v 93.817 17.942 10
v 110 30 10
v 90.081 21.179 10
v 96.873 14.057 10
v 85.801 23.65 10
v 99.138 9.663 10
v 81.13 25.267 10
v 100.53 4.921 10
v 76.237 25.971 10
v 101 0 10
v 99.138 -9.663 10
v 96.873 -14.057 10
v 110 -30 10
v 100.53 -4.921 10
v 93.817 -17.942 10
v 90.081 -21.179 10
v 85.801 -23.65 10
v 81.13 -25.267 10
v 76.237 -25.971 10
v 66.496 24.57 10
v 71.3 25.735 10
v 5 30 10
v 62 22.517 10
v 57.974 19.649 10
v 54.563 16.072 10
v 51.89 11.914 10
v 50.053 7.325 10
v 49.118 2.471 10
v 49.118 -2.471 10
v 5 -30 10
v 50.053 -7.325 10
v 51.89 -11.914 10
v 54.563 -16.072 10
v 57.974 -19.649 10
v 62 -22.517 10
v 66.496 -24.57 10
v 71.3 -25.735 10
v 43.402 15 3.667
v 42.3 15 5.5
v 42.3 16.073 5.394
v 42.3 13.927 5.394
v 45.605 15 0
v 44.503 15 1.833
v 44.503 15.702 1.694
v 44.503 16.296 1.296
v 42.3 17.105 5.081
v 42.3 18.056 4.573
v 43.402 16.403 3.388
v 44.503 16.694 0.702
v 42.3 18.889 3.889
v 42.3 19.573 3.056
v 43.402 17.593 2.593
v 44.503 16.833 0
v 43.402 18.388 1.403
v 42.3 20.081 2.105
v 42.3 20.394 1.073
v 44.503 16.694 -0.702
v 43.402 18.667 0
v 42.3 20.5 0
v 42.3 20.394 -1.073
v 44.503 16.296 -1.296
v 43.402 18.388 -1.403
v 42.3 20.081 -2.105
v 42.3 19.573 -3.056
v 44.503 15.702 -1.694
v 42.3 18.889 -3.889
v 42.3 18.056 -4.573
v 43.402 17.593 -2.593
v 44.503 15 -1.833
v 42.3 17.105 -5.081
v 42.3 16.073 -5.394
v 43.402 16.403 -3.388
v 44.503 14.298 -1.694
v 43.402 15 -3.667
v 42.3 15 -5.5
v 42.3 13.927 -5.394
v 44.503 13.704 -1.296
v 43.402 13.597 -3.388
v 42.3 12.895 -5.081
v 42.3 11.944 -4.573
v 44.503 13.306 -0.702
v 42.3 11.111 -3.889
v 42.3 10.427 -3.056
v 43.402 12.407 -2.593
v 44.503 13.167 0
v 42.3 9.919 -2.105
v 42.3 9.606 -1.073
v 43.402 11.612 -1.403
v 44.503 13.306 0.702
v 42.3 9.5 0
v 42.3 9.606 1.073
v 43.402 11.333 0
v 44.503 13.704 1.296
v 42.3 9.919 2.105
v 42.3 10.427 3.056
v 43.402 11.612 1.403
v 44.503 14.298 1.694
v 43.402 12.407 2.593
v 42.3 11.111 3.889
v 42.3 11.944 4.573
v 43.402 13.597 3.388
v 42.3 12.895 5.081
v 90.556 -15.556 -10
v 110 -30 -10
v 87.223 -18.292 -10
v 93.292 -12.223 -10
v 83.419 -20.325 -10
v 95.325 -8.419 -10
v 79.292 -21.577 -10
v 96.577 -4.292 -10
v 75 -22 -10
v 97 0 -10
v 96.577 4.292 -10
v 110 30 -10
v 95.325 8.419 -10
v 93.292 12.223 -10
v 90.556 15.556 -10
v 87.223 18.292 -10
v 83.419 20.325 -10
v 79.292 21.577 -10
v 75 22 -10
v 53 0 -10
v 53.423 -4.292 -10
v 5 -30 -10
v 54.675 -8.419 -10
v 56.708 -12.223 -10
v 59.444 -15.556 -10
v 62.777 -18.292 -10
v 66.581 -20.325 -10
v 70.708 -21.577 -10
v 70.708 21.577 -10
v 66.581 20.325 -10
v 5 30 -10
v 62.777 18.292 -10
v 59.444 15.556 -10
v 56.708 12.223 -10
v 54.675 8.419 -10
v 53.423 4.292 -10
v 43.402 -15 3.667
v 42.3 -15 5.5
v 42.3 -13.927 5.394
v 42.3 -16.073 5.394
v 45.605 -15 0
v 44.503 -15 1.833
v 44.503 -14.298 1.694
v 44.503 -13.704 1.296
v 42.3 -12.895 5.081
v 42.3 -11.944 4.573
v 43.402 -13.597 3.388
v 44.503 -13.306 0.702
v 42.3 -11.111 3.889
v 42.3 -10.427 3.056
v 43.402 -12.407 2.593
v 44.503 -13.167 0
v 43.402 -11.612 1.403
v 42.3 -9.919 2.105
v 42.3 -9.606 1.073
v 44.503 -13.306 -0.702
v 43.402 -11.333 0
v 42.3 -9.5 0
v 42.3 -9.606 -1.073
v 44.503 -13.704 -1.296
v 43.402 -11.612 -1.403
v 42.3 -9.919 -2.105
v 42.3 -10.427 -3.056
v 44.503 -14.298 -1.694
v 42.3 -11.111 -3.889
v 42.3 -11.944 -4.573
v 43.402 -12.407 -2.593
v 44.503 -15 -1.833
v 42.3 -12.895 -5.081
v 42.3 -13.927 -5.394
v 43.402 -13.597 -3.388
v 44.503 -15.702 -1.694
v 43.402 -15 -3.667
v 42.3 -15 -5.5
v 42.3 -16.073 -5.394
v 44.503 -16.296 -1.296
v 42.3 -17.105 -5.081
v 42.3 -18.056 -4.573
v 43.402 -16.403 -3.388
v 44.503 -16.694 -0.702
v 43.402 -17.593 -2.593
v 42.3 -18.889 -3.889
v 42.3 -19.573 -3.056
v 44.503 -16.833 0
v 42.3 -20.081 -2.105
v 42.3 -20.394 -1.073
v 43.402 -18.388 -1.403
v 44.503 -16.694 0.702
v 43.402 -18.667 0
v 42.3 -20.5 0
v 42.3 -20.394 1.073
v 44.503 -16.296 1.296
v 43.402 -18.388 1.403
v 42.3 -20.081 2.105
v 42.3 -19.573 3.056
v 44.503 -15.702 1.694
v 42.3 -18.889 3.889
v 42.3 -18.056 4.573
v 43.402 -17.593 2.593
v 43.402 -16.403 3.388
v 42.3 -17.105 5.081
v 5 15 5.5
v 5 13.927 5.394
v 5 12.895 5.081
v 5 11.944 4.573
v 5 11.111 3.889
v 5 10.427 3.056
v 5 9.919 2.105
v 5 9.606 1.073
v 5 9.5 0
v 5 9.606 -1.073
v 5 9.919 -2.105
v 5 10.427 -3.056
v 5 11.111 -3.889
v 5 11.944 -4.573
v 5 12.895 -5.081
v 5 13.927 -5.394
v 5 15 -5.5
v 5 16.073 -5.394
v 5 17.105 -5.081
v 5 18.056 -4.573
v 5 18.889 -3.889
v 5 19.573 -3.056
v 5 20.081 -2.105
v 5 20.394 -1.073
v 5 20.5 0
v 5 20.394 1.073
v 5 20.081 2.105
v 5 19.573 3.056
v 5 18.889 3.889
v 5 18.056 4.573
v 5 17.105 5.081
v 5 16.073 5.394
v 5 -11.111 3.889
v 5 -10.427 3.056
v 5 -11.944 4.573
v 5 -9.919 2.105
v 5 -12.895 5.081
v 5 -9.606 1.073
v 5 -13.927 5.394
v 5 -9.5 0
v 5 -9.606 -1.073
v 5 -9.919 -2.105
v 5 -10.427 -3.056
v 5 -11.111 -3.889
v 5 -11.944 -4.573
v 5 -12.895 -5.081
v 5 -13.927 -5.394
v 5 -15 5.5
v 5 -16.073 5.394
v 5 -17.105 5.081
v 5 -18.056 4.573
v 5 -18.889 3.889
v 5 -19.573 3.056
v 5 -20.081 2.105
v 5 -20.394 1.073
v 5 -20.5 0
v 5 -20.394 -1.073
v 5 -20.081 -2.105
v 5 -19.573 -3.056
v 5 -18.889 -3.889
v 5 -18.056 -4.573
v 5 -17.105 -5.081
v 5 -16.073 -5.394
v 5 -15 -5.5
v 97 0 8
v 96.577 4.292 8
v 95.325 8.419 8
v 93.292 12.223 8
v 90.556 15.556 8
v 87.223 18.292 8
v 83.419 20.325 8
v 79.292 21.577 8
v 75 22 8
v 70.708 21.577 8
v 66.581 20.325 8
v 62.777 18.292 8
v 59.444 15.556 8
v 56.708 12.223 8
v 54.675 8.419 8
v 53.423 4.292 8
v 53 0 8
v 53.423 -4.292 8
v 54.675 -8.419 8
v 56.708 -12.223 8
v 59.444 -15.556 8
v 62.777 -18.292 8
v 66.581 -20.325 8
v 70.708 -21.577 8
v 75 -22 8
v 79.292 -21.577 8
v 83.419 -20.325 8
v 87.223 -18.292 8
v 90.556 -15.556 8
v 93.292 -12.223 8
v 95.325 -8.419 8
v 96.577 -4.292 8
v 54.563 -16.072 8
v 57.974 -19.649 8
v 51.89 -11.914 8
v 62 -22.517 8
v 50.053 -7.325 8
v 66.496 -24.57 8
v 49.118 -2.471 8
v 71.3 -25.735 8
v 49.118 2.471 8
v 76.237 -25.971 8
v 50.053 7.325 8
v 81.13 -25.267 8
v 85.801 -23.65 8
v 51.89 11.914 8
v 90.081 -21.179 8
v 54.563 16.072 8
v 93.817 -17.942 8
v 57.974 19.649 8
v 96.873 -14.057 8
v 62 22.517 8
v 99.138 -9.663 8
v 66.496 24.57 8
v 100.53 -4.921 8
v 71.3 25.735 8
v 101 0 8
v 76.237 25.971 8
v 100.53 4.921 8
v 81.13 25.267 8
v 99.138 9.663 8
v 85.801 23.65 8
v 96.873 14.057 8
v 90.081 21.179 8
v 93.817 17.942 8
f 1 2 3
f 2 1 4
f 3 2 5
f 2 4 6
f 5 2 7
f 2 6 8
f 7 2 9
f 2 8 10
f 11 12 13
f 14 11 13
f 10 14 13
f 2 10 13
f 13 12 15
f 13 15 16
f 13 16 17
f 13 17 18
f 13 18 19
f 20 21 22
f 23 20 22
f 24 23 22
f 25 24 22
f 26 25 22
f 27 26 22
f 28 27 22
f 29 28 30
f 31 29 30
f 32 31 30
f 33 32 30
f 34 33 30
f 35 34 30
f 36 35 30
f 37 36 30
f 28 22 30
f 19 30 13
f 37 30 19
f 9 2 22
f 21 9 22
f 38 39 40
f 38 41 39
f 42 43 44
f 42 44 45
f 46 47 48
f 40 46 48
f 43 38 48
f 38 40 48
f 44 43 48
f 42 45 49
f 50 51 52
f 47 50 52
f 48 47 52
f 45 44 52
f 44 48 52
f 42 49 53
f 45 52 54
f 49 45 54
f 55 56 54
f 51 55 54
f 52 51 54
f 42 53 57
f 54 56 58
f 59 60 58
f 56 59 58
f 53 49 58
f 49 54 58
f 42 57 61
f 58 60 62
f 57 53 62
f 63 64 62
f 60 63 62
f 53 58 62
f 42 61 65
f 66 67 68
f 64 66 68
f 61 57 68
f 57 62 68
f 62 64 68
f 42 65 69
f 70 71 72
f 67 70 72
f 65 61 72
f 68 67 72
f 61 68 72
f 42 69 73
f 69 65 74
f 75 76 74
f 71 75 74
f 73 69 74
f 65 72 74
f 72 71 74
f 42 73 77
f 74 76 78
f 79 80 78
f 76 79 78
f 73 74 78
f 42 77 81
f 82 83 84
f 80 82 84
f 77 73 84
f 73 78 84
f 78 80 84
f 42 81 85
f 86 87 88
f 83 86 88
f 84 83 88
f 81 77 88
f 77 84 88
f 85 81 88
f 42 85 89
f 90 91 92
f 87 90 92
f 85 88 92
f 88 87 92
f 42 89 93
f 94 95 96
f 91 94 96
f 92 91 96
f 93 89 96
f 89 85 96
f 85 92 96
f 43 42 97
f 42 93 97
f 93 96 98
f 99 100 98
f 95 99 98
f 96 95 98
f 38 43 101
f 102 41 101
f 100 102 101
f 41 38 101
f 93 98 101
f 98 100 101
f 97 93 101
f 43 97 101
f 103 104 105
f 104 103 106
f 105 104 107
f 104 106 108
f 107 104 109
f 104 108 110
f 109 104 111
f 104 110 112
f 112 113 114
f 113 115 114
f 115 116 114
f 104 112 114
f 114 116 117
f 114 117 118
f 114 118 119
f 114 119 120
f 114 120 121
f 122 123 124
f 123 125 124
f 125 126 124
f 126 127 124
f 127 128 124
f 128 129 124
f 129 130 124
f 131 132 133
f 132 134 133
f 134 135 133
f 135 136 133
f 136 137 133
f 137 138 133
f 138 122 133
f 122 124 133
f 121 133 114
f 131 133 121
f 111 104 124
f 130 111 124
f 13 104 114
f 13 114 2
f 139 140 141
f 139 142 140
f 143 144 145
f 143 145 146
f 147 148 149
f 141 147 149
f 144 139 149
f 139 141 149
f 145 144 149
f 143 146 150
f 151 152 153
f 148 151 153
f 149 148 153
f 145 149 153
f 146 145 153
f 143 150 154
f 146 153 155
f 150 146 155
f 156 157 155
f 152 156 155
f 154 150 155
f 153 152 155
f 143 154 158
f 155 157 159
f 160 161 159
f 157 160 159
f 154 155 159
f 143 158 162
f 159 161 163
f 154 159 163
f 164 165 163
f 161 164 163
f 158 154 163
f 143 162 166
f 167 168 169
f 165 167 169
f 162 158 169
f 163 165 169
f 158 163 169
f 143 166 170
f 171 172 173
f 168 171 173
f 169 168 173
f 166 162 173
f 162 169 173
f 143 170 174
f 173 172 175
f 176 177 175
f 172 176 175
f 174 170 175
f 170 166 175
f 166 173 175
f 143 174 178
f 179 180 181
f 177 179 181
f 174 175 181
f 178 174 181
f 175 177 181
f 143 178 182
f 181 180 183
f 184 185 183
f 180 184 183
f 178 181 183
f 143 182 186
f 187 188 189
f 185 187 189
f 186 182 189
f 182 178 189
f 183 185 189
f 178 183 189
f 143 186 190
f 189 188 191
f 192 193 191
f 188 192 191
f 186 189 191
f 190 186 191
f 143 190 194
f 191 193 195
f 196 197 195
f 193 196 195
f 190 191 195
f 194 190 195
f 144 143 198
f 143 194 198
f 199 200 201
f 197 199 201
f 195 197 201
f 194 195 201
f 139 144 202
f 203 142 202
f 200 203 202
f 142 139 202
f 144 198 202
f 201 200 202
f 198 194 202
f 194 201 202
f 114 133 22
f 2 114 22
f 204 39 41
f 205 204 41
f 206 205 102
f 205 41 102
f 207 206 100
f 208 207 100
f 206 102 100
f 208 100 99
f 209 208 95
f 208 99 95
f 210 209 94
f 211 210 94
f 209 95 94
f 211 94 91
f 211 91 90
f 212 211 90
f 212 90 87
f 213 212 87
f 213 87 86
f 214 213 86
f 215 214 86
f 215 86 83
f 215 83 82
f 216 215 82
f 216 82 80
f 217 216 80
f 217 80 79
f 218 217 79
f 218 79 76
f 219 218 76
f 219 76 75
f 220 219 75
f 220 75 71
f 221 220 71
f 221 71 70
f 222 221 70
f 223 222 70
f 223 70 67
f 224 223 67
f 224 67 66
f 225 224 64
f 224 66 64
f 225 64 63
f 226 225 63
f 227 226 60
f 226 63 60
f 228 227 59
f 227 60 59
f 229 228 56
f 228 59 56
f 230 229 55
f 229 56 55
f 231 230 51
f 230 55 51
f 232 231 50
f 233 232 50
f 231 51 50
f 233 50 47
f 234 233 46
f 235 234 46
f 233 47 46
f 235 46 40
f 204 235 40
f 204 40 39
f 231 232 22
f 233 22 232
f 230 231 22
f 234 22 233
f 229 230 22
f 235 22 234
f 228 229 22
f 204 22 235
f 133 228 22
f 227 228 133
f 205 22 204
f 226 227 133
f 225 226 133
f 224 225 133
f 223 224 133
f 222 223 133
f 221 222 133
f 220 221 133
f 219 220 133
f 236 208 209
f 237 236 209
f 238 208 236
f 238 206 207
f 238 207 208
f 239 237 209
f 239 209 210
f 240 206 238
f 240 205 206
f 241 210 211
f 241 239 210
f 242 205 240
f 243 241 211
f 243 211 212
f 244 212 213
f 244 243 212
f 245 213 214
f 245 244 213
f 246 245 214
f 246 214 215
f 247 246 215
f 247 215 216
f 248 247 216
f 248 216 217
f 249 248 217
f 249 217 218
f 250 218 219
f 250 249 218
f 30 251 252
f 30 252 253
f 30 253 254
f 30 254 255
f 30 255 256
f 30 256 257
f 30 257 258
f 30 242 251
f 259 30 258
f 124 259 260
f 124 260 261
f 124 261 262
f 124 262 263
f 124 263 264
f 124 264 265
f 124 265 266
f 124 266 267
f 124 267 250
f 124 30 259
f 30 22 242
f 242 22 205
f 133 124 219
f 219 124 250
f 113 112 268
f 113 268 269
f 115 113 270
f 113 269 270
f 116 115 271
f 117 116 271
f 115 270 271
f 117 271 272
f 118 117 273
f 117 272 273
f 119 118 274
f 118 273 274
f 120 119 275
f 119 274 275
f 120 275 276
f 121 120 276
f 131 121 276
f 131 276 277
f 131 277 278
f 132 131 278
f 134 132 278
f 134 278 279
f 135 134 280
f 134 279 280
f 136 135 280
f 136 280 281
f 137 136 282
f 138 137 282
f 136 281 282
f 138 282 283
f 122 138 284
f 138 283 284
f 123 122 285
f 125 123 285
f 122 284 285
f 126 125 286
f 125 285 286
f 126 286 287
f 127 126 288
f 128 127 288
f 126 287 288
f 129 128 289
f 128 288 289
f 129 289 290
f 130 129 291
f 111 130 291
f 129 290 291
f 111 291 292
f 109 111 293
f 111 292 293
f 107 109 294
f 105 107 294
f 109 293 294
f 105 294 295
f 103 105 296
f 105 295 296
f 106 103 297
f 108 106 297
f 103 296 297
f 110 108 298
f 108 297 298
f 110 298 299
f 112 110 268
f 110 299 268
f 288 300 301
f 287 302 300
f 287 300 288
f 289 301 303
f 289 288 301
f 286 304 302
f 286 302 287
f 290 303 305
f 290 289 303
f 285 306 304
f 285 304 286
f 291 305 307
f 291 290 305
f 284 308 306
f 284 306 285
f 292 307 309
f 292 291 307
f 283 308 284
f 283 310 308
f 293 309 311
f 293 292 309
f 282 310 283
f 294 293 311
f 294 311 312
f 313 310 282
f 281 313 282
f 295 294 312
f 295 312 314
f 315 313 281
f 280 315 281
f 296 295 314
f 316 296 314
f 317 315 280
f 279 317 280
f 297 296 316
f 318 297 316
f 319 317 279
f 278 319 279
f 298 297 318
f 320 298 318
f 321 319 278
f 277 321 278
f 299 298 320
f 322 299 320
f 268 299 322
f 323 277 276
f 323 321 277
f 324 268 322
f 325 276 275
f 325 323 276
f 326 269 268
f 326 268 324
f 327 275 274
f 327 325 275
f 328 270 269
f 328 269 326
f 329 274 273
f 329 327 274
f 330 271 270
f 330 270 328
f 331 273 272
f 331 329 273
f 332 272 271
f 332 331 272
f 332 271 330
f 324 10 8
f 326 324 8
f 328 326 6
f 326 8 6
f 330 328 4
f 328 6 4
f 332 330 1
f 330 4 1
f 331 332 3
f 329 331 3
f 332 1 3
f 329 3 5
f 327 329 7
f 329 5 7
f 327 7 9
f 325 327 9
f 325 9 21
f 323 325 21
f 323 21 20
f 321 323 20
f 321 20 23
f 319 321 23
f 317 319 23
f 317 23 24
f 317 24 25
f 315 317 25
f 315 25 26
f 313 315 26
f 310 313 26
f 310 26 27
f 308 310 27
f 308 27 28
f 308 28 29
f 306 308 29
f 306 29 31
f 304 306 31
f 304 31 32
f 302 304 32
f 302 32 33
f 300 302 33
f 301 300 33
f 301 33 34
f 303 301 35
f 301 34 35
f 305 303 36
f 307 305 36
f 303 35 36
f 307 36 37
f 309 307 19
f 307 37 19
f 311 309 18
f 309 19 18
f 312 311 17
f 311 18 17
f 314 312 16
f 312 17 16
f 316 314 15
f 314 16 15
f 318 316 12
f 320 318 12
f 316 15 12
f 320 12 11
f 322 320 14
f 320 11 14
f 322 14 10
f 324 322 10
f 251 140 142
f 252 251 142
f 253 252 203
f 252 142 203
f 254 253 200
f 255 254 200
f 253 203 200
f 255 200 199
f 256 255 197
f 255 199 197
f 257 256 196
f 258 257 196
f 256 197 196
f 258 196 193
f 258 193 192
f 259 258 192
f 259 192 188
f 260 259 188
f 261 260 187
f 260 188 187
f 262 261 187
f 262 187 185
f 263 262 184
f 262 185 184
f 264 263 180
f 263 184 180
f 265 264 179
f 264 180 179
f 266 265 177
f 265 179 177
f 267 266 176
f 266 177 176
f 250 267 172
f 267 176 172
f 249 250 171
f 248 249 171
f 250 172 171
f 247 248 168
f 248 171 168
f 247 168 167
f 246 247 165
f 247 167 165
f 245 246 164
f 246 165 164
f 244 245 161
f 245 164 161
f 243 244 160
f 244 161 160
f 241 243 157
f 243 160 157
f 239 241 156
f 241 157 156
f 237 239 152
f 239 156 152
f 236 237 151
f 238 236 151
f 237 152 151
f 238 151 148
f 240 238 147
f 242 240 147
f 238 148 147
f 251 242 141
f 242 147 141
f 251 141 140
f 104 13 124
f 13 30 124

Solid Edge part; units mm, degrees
sketch "Sketch1" plane through (0, 0, 0) normal (1, 0, 0) x (0, 1, 0)
  line L0 (-30, -10) -> (30, -10)
  line L1 (30, -10) -> (30, 10)
  line L2 (30, 10) -> (-30, 10)
  line L3 (-30, 10) -> (-30, -10)
extrude "Protrusion1" add sketch "Sketch1" along normal blind 110
sketch "Sketch2" plane through (50, 0, 10) normal (0, 0, 1) x (1, 0, 0)
  circle A0 centre (25, 0) radius 22
extrude "ExtrudedCutout_1" cut sketch "Sketch2" against normal blind 30.1603
sketch "Sketch3" plane through (50, 0, 10) normal (0, 0, 1) x (1, 0, 0)
  circle A0 centre (25, 0) radius 26
extrude "ExtrudedCutout_2" cut sketch "Sketch3" against normal blind 2
sketch "Sketch4" plane through (0, 0, 0) normal (-1, 0, 0) x (0, -1, 0)
  line L0 (30, 10) -> (-30, 10)
  line L1 (-30, 10) -> (-30, -10)
  line L2 (-30, -10) -> (30, -10)
  line L3 (30, -10) -> (30, 10)
extrude "Cutout1" cut sketch "Sketch4" against normal blind 5
hole "Hole_2" at (5, 15, 0) direction (1, 0, 0) diameter 11 depth 37.3 tip angle 118
hole "Hole1" at (5, -15, 0) direction (1, 0, 0) diameter 11 depth 37.3 tip angle 118
properties material "Steel - Stainless:1.4301 , X5CrNi18-10"
